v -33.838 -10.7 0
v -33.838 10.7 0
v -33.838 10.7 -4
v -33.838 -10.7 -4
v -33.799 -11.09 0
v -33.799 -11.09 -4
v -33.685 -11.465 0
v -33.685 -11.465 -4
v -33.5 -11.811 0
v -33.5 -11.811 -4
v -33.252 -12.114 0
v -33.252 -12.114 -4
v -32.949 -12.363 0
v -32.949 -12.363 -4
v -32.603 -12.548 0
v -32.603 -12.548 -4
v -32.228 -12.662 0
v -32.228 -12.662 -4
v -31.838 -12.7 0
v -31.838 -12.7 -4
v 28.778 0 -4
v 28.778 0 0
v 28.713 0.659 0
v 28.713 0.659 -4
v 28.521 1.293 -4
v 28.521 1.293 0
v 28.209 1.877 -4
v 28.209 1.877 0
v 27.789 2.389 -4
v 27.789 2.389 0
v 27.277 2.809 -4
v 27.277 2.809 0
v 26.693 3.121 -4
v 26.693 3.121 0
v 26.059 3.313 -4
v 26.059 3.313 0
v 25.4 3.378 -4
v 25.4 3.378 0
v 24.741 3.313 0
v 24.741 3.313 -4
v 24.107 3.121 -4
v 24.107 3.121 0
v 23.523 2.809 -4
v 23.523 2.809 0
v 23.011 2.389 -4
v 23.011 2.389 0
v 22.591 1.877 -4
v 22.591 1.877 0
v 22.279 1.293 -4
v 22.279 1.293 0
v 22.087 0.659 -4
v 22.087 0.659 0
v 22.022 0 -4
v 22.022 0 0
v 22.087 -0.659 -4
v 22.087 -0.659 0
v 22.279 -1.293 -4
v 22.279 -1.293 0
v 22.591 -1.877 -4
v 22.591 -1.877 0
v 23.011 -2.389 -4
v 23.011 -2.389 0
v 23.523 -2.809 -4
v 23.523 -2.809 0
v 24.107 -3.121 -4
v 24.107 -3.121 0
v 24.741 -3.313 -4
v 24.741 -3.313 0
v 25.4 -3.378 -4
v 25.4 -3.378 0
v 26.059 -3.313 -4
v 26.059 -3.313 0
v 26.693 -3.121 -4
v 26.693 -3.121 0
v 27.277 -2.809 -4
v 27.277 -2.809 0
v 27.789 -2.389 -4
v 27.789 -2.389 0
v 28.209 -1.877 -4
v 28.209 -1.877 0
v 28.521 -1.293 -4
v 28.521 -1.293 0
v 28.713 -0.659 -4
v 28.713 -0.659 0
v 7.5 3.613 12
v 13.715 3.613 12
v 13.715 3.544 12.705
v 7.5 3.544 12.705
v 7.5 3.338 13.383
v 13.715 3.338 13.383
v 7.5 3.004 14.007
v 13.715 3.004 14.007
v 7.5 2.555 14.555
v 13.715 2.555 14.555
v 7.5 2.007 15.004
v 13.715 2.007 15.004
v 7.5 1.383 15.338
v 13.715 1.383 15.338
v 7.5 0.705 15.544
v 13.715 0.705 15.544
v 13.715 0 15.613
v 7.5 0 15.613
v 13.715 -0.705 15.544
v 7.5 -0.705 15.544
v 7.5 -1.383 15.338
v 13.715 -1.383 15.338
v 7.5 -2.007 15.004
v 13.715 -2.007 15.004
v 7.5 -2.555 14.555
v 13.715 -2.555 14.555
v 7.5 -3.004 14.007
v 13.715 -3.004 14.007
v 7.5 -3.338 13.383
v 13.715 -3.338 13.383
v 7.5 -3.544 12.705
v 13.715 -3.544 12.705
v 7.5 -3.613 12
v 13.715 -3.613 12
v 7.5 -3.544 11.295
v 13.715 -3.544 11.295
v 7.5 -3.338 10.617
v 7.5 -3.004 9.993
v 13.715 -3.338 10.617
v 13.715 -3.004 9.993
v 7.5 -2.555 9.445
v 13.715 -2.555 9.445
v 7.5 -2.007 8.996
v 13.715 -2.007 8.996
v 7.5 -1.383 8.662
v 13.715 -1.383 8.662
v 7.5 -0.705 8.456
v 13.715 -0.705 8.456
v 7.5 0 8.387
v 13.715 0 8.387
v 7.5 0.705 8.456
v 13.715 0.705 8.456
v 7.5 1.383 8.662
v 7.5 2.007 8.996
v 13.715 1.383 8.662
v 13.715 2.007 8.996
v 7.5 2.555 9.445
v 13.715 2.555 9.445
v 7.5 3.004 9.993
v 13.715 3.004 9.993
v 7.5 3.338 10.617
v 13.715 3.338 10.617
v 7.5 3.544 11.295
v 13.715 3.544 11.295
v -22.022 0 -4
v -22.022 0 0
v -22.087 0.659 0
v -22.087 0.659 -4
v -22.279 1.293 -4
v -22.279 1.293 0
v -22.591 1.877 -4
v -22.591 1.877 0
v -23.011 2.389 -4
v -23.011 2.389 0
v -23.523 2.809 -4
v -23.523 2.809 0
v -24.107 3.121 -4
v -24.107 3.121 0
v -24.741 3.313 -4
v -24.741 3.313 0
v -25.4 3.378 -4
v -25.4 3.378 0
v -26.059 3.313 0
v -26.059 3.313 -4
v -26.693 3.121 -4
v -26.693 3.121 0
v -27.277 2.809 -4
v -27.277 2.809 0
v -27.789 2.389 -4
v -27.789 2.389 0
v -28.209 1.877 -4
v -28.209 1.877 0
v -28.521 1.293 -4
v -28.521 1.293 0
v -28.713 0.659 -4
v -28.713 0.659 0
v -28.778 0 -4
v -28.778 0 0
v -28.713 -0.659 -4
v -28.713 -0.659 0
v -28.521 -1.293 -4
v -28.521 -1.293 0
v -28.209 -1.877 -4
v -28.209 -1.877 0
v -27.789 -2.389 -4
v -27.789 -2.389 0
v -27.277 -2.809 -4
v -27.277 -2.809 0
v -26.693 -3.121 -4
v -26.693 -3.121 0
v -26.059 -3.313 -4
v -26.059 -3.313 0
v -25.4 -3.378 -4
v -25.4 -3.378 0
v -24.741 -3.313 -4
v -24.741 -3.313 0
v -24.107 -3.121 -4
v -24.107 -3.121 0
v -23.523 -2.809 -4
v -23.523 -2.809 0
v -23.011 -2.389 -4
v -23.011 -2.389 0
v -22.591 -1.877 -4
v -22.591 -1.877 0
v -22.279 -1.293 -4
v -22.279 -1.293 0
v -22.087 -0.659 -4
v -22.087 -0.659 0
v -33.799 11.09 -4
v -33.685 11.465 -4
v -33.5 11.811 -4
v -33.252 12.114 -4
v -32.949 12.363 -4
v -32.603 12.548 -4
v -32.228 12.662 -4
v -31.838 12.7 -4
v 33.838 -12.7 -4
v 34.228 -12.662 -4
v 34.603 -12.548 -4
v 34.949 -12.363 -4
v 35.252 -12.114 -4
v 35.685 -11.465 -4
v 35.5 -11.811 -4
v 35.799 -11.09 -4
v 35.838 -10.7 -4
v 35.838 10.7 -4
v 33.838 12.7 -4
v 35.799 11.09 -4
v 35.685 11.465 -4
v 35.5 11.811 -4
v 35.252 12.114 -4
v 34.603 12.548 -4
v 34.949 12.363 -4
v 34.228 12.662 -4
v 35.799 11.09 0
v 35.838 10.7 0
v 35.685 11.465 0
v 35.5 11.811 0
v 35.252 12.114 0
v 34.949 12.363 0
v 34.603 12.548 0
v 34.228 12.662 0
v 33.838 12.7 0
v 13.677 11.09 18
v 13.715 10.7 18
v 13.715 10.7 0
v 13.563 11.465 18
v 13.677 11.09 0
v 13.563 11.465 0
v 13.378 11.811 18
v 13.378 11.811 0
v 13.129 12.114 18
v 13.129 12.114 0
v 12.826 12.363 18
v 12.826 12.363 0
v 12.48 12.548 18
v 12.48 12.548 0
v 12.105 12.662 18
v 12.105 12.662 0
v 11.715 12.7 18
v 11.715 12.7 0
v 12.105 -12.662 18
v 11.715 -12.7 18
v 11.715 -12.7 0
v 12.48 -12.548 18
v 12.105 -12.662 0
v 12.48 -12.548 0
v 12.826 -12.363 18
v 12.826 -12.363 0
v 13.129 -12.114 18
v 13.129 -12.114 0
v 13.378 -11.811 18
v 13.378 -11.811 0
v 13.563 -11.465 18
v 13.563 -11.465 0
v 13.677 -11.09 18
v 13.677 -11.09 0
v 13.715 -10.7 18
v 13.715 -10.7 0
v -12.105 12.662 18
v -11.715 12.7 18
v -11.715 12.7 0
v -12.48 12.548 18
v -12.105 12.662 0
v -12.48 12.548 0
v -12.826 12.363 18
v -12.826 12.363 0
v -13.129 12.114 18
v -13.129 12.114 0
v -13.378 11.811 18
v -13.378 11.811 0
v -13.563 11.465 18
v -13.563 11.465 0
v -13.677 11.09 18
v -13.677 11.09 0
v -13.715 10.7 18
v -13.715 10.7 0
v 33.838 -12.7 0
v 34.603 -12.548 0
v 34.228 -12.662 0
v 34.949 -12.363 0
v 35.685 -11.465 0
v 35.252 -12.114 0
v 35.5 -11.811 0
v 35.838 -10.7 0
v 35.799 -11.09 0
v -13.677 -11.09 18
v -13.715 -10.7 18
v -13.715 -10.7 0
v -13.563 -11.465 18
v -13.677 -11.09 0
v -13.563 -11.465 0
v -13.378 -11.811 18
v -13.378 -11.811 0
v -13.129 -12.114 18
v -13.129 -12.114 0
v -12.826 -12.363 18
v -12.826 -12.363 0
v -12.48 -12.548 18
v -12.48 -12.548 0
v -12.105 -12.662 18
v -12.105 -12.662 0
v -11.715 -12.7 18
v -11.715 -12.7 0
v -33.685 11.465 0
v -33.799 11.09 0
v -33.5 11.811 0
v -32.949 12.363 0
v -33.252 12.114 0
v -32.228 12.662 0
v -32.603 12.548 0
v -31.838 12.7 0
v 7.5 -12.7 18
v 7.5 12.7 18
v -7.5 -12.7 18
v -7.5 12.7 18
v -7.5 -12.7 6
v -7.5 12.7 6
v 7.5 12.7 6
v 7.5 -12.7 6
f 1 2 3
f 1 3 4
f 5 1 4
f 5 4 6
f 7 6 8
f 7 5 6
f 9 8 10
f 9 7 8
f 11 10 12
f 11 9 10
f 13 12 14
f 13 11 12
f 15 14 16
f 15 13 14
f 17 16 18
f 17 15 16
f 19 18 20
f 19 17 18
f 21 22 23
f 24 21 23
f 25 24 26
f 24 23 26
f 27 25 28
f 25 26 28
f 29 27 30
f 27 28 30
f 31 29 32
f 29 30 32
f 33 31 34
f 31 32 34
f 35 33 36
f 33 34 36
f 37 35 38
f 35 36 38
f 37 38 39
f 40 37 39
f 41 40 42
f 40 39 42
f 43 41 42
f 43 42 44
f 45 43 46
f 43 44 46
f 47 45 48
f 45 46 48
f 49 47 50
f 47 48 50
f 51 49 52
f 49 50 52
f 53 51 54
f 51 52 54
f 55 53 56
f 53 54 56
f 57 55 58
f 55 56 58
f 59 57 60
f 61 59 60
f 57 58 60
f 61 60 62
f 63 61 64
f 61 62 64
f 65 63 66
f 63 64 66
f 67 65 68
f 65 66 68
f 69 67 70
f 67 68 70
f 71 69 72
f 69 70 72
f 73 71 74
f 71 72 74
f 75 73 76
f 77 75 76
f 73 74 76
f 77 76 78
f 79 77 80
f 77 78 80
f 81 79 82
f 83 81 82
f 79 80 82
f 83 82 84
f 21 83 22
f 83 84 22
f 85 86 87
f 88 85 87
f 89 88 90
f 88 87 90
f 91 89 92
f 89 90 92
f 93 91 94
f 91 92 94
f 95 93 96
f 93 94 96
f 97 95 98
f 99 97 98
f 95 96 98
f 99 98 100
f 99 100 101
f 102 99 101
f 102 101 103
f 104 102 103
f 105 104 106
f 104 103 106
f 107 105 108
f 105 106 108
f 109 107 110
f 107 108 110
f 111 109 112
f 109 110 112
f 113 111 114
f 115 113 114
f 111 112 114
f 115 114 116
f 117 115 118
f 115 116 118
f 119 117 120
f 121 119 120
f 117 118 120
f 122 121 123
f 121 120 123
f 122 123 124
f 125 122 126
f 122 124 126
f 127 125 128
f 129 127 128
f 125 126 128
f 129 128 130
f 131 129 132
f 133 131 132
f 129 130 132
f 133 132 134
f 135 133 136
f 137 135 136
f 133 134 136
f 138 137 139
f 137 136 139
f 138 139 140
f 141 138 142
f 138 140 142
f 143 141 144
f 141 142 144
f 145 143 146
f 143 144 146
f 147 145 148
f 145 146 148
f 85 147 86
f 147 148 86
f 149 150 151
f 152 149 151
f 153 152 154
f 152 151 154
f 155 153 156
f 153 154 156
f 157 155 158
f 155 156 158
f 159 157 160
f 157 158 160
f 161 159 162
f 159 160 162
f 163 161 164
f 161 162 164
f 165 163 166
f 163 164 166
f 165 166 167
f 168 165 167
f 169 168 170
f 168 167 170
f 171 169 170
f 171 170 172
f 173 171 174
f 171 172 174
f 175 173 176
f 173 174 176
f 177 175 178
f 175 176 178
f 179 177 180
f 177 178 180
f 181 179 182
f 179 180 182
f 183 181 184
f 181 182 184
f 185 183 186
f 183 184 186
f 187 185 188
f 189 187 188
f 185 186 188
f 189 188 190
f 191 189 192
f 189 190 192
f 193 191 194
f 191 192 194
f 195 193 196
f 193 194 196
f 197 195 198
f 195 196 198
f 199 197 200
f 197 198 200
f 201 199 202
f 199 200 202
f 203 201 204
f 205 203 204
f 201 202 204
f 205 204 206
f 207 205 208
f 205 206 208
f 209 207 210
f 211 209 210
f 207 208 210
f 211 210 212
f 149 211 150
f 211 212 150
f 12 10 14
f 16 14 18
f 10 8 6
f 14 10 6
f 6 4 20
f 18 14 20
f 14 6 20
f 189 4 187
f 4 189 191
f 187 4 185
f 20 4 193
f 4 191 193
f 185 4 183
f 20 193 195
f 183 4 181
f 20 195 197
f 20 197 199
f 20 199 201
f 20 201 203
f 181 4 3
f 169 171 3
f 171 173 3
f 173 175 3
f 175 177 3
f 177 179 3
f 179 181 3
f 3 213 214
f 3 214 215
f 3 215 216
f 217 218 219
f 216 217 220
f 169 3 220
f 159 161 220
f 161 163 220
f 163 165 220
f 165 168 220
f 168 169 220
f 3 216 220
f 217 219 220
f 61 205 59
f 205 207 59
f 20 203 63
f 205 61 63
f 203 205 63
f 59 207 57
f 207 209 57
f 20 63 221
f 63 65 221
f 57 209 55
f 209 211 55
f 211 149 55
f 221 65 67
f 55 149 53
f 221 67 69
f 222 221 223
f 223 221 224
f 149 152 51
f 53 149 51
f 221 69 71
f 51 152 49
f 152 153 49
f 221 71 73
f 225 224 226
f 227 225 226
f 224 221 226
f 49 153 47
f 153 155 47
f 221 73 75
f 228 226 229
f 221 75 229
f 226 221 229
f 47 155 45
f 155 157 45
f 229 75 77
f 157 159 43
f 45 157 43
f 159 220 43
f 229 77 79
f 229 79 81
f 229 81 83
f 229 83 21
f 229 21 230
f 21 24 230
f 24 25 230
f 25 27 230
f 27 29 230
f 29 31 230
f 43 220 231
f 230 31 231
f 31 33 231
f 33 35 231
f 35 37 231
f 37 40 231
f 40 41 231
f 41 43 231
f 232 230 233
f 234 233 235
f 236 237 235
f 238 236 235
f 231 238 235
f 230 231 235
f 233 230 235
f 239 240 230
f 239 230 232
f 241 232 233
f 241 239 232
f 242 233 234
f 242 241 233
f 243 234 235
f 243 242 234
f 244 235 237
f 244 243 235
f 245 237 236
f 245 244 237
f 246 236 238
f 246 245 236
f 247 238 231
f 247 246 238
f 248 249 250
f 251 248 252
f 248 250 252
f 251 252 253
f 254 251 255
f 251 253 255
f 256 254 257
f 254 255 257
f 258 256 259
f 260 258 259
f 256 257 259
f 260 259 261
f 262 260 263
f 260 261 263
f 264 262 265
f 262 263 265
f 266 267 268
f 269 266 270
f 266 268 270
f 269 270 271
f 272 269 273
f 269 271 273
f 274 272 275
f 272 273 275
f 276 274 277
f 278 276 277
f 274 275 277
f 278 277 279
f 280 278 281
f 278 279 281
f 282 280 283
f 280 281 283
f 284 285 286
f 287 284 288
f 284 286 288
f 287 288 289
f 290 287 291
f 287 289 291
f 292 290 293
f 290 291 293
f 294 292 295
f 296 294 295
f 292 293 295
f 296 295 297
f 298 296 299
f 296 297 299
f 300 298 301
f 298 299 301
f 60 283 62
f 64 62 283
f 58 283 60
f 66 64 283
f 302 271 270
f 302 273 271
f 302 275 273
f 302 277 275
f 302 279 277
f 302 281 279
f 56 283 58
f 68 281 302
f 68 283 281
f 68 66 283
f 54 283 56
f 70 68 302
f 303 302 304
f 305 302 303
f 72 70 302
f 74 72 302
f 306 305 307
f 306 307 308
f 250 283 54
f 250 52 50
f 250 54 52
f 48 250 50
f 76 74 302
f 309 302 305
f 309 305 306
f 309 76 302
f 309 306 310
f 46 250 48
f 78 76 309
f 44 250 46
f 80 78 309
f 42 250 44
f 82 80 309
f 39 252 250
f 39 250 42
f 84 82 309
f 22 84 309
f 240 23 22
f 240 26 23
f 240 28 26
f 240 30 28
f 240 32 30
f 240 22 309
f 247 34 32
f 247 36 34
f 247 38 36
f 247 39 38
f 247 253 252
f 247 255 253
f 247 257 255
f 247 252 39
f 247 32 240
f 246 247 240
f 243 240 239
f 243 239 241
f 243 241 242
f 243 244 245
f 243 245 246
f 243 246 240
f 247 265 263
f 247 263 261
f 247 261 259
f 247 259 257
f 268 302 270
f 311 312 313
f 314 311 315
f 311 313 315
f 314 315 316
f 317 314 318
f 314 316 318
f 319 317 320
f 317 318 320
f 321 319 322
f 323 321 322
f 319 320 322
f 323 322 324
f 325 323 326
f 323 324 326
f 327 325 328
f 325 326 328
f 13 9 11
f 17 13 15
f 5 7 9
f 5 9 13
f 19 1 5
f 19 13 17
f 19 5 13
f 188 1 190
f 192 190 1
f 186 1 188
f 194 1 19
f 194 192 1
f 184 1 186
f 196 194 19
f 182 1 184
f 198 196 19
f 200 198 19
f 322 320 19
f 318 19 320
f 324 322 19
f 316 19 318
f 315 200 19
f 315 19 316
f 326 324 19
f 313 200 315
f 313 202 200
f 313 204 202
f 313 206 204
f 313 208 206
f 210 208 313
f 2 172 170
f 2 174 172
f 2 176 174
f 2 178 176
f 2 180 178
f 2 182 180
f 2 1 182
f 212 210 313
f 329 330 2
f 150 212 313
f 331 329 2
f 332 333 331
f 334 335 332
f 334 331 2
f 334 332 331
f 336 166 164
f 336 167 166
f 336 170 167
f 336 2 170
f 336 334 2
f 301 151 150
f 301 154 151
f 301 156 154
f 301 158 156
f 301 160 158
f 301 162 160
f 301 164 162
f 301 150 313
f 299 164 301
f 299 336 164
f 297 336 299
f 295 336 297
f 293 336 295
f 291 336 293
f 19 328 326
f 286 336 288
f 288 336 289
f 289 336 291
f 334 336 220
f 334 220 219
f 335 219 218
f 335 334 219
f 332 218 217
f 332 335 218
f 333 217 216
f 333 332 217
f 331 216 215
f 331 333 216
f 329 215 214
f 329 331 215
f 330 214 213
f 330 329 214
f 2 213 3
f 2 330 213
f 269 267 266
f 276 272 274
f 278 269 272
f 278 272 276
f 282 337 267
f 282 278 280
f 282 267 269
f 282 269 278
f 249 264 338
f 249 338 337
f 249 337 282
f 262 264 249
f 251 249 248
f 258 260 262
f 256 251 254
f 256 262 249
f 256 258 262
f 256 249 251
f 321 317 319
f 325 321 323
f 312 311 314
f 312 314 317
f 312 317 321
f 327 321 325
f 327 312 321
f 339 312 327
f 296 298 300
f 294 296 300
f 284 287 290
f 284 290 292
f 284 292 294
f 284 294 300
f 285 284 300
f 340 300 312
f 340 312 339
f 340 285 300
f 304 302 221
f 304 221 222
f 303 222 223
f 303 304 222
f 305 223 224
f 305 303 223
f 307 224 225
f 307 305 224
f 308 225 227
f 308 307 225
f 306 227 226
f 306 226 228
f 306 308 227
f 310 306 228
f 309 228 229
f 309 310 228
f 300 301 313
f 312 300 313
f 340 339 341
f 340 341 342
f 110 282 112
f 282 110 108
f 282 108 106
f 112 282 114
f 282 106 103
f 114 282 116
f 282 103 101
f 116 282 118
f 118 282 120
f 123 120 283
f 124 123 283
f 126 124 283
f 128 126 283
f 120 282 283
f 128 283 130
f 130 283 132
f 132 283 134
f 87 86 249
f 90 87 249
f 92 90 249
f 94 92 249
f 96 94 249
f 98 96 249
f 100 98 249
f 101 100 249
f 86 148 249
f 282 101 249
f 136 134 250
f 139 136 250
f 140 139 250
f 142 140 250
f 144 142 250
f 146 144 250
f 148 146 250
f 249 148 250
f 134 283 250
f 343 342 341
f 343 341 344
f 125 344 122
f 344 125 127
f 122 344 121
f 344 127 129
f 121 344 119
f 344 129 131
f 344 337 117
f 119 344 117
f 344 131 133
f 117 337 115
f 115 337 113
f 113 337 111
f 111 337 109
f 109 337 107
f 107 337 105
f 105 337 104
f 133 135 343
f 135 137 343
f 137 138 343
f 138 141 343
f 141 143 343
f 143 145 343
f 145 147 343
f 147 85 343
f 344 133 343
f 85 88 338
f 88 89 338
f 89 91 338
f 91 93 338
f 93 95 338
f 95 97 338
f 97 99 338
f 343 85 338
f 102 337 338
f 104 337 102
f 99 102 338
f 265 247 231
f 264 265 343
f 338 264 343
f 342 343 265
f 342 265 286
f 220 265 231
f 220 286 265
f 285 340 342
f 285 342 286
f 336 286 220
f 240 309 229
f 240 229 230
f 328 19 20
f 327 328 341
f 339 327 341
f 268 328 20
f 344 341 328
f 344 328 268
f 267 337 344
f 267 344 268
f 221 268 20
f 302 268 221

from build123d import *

# Parameters (mm, degrees)
PAD_DEPTH       = 18
SKETCH001_R     = 3.3782
PAD001_DEPTH    = 4
SKETCH002_W     = 15
SKETCH002_H     = 25.4
POCKET_DEPTH    = 12
SKETCH003_R     = 3.61315
POCKET001_DEPTH = 6.215


with BuildPart() as part:
    # Sketch → Pad (new body)
    with BuildSketch(Plane.XY):
        with BuildLine():
            Line((-13.715, 10.7), (-13.715, -10.7))
            ThreePointArc((-13.715, -10.7), (-13.129214, -12.114214), (-11.715, -12.7))
            Line((-11.715, -12.7), (11.715, -12.7))
            ThreePointArc((11.715, -12.7), (13.129214, -12.114214), (13.715, -10.7))
            Line((13.715, -10.7), (13.715, 10.7))
            ThreePointArc((13.715, 10.7), (13.129214, 12.114214), (11.715, 12.7))
            Line((11.715, 12.7), (-11.715, 12.7))
            ThreePointArc((-11.715, 12.7), (-13.129214, 12.114214), (-13.715, 10.7))
        make_face()
    extrude(amount=PAD_DEPTH)

    # Sketch001 → Pad001 (join)
    with BuildSketch(Plane.XY):
        with BuildLine():
            Line((-33.8375, 10.7), (-33.8375, -10.7))
            ThreePointArc((-33.8375, -10.7), (-33.251714, -12.114214), (-31.8375, -12.7))
            Line((-31.8375, -12.7), (33.8375, -12.7))
            ThreePointArc((33.8375, -12.7), (35.251714, -12.114214), (35.8375, -10.7))
            Line((35.8375, -10.7), (35.8375, 10.7))
            ThreePointArc((35.8375, 10.7), (35.251714, 12.114214), (33.8375, 12.7))
            Line((33.8375, 12.7), (-31.8375, 12.7))
            ThreePointArc((-31.8375, 12.7), (-33.251714, 12.114214), (-33.8375, 10.7))
        make_face()
        with Locations((-25.4, 0)):
            Circle(SKETCH001_R, mode=Mode.SUBTRACT)
        with Locations((25.4, 0)):
            Circle(SKETCH001_R, mode=Mode.SUBTRACT)
    extrude(amount=-PAD001_DEPTH)

    # Sketch002 (on DatumPlane) → Pocket (cut)
    with BuildSketch(Plane.XY.offset(18)):
        Rectangle(SKETCH002_W, SKETCH002_H)
    extrude(amount=-POCKET_DEPTH, mode=Mode.SUBTRACT)

    # Sketch003 (on DatumPlane) → Pocket001 (cut)
    with BuildSketch(Plane.YZ.offset(13.715)):
        with Locations((0, 12)):
            Circle(SKETCH003_R)
    extrude(amount=-POCKET001_DEPTH, mode=Mode.SUBTRACT)


solid = part.part
